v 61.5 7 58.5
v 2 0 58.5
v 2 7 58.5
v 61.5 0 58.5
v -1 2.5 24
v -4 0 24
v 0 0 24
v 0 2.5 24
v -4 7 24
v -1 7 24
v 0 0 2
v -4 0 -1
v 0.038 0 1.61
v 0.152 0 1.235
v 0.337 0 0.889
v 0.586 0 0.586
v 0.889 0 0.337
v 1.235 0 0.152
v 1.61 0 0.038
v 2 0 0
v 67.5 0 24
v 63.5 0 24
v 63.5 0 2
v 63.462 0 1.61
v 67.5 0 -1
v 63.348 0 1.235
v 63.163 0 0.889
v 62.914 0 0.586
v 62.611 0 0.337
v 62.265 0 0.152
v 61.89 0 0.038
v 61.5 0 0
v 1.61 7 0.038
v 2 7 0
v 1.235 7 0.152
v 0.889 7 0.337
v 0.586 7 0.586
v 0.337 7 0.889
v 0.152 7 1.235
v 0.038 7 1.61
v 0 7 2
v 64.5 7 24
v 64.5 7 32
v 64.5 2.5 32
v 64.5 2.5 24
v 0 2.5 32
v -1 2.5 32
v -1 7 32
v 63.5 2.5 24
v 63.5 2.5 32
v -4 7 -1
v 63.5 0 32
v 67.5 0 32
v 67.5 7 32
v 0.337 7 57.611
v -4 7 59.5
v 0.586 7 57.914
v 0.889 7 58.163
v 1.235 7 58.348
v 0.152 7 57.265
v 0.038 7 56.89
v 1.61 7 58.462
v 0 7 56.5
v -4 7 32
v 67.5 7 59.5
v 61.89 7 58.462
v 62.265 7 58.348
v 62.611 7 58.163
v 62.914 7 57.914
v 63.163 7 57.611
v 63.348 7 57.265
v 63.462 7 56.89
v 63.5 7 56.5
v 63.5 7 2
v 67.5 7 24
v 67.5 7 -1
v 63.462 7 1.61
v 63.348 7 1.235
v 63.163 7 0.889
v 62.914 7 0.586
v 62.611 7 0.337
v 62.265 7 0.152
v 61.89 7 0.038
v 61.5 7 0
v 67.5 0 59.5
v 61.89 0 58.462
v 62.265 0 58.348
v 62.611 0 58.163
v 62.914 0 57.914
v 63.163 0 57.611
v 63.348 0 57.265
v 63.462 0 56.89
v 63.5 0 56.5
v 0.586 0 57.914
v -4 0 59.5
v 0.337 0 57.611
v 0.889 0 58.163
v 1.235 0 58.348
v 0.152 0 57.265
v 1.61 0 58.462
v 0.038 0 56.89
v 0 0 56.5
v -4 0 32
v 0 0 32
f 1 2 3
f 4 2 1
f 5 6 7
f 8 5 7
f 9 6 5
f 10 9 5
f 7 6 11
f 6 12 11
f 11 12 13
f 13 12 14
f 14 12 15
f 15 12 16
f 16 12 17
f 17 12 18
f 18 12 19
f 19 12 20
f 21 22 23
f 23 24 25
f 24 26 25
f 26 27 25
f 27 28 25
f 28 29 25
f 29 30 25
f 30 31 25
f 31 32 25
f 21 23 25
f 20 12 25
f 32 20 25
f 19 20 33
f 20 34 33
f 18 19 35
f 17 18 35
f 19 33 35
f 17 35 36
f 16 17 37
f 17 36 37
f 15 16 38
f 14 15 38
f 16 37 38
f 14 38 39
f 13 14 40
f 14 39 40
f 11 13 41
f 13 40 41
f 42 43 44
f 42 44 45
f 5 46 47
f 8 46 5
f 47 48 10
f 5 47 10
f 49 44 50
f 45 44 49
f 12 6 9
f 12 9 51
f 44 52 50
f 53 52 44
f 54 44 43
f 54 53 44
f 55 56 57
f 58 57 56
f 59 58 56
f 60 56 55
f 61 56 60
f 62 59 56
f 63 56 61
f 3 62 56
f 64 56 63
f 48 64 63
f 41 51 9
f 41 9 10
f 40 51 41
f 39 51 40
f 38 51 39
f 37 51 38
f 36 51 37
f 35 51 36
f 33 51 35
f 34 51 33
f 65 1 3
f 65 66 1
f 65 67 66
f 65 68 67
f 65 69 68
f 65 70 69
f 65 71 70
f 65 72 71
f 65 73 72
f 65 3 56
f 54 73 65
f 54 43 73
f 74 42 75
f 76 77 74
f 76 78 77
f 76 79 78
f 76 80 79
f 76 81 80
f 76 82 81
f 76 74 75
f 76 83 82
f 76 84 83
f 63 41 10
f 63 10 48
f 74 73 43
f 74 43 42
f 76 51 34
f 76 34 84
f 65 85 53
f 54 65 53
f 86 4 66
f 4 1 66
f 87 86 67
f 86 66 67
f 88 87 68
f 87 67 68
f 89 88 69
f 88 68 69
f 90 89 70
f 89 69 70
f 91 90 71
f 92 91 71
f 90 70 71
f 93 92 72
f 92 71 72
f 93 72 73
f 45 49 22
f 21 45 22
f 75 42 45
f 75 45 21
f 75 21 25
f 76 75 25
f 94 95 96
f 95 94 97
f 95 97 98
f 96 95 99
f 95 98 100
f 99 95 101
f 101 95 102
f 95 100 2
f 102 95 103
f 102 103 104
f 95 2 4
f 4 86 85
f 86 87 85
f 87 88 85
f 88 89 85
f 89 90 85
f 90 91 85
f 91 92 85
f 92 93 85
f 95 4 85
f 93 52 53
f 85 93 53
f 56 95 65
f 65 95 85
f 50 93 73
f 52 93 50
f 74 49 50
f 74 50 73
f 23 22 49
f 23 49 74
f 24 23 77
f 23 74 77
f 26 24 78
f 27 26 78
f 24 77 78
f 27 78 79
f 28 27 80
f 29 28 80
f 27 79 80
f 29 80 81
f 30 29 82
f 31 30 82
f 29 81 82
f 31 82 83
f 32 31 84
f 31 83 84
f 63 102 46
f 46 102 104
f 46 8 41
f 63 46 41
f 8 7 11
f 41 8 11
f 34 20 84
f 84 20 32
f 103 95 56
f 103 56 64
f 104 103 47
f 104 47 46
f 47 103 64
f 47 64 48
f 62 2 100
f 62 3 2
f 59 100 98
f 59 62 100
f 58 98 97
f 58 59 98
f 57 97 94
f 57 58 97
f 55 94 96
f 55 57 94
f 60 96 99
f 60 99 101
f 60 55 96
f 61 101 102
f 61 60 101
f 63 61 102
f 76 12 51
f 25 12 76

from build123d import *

# Parameters (mm, degrees)
SKETCH_1_W          = 71.5
SKETCH_1_H          = 60.5
SKETCH_1_W_2        = 63.5
SKETCH_1_H_2        = 58.5
EXTRUDE_1_DEPTH     = 7
FILLET_1_R          = 2
SKETCH_2_W          = 3
SKETCH_2_H          = 8
CUT_EXTRUDE_1_DEPTH = 7
SKETCH_3_W          = 8
SKETCH_3_H          = 2.5
CUT_EXTRUDE_2_DEPTH = 92.002747211


with BuildPart() as part:
    # Эскиз1 → Бобышка-Вытянуть1 (new body)
    with BuildSketch(Plane(origin=(0, 0, 0), x_dir=(1, 0, 0), z_dir=(0, 1, 0))):
        with Locations((31.75, -29.25)):
            Rectangle(SKETCH_1_W, SKETCH_1_H)
        with Locations((31.75, -29.25)):
            Rectangle(SKETCH_1_W_2, SKETCH_1_H_2, mode=Mode.SUBTRACT)
    extrude(amount=EXTRUDE_1_DEPTH)

    # Скругление1
    fillet_1_edges = [part.edges().sort_by_distance(p)[0] for p in [
        (0, 3.5, 0),
        (0, 3.5, 58.5),
        (63.5, 3.5, 58.5),
        (63.5, 3.5, 0),
    ]]
    fillet(fillet_1_edges, radius=FILLET_1_R)

    # Эскиз2 → Вырез-Вытянуть1 (cut)
    with BuildSketch(Plane(origin=(0, 7, 0), x_dir=(1, 0, 0), z_dir=(0, 1, 0))):
        with Locations((-2.5, -28)):
            Rectangle(SKETCH_2_W, SKETCH_2_H)
        with Locations((66, -28)):
            Rectangle(SKETCH_2_W, SKETCH_2_H)
    extrude(amount=-CUT_EXTRUDE_1_DEPTH, mode=Mode.SUBTRACT)

    # Эскиз3 → Вырез-Вытянуть2 (cut, through all)
    with BuildSketch(Plane(origin=(64.5, 0, 0), x_dir=(0, 0, -1), z_dir=(1, 0, 0))):
        with Locations((-28, 1.25)):
            Rectangle(SKETCH_3_W, SKETCH_3_H)
    extrude(amount=-CUT_EXTRUDE_2_DEPTH, mode=Mode.SUBTRACT)


solid = part.part
